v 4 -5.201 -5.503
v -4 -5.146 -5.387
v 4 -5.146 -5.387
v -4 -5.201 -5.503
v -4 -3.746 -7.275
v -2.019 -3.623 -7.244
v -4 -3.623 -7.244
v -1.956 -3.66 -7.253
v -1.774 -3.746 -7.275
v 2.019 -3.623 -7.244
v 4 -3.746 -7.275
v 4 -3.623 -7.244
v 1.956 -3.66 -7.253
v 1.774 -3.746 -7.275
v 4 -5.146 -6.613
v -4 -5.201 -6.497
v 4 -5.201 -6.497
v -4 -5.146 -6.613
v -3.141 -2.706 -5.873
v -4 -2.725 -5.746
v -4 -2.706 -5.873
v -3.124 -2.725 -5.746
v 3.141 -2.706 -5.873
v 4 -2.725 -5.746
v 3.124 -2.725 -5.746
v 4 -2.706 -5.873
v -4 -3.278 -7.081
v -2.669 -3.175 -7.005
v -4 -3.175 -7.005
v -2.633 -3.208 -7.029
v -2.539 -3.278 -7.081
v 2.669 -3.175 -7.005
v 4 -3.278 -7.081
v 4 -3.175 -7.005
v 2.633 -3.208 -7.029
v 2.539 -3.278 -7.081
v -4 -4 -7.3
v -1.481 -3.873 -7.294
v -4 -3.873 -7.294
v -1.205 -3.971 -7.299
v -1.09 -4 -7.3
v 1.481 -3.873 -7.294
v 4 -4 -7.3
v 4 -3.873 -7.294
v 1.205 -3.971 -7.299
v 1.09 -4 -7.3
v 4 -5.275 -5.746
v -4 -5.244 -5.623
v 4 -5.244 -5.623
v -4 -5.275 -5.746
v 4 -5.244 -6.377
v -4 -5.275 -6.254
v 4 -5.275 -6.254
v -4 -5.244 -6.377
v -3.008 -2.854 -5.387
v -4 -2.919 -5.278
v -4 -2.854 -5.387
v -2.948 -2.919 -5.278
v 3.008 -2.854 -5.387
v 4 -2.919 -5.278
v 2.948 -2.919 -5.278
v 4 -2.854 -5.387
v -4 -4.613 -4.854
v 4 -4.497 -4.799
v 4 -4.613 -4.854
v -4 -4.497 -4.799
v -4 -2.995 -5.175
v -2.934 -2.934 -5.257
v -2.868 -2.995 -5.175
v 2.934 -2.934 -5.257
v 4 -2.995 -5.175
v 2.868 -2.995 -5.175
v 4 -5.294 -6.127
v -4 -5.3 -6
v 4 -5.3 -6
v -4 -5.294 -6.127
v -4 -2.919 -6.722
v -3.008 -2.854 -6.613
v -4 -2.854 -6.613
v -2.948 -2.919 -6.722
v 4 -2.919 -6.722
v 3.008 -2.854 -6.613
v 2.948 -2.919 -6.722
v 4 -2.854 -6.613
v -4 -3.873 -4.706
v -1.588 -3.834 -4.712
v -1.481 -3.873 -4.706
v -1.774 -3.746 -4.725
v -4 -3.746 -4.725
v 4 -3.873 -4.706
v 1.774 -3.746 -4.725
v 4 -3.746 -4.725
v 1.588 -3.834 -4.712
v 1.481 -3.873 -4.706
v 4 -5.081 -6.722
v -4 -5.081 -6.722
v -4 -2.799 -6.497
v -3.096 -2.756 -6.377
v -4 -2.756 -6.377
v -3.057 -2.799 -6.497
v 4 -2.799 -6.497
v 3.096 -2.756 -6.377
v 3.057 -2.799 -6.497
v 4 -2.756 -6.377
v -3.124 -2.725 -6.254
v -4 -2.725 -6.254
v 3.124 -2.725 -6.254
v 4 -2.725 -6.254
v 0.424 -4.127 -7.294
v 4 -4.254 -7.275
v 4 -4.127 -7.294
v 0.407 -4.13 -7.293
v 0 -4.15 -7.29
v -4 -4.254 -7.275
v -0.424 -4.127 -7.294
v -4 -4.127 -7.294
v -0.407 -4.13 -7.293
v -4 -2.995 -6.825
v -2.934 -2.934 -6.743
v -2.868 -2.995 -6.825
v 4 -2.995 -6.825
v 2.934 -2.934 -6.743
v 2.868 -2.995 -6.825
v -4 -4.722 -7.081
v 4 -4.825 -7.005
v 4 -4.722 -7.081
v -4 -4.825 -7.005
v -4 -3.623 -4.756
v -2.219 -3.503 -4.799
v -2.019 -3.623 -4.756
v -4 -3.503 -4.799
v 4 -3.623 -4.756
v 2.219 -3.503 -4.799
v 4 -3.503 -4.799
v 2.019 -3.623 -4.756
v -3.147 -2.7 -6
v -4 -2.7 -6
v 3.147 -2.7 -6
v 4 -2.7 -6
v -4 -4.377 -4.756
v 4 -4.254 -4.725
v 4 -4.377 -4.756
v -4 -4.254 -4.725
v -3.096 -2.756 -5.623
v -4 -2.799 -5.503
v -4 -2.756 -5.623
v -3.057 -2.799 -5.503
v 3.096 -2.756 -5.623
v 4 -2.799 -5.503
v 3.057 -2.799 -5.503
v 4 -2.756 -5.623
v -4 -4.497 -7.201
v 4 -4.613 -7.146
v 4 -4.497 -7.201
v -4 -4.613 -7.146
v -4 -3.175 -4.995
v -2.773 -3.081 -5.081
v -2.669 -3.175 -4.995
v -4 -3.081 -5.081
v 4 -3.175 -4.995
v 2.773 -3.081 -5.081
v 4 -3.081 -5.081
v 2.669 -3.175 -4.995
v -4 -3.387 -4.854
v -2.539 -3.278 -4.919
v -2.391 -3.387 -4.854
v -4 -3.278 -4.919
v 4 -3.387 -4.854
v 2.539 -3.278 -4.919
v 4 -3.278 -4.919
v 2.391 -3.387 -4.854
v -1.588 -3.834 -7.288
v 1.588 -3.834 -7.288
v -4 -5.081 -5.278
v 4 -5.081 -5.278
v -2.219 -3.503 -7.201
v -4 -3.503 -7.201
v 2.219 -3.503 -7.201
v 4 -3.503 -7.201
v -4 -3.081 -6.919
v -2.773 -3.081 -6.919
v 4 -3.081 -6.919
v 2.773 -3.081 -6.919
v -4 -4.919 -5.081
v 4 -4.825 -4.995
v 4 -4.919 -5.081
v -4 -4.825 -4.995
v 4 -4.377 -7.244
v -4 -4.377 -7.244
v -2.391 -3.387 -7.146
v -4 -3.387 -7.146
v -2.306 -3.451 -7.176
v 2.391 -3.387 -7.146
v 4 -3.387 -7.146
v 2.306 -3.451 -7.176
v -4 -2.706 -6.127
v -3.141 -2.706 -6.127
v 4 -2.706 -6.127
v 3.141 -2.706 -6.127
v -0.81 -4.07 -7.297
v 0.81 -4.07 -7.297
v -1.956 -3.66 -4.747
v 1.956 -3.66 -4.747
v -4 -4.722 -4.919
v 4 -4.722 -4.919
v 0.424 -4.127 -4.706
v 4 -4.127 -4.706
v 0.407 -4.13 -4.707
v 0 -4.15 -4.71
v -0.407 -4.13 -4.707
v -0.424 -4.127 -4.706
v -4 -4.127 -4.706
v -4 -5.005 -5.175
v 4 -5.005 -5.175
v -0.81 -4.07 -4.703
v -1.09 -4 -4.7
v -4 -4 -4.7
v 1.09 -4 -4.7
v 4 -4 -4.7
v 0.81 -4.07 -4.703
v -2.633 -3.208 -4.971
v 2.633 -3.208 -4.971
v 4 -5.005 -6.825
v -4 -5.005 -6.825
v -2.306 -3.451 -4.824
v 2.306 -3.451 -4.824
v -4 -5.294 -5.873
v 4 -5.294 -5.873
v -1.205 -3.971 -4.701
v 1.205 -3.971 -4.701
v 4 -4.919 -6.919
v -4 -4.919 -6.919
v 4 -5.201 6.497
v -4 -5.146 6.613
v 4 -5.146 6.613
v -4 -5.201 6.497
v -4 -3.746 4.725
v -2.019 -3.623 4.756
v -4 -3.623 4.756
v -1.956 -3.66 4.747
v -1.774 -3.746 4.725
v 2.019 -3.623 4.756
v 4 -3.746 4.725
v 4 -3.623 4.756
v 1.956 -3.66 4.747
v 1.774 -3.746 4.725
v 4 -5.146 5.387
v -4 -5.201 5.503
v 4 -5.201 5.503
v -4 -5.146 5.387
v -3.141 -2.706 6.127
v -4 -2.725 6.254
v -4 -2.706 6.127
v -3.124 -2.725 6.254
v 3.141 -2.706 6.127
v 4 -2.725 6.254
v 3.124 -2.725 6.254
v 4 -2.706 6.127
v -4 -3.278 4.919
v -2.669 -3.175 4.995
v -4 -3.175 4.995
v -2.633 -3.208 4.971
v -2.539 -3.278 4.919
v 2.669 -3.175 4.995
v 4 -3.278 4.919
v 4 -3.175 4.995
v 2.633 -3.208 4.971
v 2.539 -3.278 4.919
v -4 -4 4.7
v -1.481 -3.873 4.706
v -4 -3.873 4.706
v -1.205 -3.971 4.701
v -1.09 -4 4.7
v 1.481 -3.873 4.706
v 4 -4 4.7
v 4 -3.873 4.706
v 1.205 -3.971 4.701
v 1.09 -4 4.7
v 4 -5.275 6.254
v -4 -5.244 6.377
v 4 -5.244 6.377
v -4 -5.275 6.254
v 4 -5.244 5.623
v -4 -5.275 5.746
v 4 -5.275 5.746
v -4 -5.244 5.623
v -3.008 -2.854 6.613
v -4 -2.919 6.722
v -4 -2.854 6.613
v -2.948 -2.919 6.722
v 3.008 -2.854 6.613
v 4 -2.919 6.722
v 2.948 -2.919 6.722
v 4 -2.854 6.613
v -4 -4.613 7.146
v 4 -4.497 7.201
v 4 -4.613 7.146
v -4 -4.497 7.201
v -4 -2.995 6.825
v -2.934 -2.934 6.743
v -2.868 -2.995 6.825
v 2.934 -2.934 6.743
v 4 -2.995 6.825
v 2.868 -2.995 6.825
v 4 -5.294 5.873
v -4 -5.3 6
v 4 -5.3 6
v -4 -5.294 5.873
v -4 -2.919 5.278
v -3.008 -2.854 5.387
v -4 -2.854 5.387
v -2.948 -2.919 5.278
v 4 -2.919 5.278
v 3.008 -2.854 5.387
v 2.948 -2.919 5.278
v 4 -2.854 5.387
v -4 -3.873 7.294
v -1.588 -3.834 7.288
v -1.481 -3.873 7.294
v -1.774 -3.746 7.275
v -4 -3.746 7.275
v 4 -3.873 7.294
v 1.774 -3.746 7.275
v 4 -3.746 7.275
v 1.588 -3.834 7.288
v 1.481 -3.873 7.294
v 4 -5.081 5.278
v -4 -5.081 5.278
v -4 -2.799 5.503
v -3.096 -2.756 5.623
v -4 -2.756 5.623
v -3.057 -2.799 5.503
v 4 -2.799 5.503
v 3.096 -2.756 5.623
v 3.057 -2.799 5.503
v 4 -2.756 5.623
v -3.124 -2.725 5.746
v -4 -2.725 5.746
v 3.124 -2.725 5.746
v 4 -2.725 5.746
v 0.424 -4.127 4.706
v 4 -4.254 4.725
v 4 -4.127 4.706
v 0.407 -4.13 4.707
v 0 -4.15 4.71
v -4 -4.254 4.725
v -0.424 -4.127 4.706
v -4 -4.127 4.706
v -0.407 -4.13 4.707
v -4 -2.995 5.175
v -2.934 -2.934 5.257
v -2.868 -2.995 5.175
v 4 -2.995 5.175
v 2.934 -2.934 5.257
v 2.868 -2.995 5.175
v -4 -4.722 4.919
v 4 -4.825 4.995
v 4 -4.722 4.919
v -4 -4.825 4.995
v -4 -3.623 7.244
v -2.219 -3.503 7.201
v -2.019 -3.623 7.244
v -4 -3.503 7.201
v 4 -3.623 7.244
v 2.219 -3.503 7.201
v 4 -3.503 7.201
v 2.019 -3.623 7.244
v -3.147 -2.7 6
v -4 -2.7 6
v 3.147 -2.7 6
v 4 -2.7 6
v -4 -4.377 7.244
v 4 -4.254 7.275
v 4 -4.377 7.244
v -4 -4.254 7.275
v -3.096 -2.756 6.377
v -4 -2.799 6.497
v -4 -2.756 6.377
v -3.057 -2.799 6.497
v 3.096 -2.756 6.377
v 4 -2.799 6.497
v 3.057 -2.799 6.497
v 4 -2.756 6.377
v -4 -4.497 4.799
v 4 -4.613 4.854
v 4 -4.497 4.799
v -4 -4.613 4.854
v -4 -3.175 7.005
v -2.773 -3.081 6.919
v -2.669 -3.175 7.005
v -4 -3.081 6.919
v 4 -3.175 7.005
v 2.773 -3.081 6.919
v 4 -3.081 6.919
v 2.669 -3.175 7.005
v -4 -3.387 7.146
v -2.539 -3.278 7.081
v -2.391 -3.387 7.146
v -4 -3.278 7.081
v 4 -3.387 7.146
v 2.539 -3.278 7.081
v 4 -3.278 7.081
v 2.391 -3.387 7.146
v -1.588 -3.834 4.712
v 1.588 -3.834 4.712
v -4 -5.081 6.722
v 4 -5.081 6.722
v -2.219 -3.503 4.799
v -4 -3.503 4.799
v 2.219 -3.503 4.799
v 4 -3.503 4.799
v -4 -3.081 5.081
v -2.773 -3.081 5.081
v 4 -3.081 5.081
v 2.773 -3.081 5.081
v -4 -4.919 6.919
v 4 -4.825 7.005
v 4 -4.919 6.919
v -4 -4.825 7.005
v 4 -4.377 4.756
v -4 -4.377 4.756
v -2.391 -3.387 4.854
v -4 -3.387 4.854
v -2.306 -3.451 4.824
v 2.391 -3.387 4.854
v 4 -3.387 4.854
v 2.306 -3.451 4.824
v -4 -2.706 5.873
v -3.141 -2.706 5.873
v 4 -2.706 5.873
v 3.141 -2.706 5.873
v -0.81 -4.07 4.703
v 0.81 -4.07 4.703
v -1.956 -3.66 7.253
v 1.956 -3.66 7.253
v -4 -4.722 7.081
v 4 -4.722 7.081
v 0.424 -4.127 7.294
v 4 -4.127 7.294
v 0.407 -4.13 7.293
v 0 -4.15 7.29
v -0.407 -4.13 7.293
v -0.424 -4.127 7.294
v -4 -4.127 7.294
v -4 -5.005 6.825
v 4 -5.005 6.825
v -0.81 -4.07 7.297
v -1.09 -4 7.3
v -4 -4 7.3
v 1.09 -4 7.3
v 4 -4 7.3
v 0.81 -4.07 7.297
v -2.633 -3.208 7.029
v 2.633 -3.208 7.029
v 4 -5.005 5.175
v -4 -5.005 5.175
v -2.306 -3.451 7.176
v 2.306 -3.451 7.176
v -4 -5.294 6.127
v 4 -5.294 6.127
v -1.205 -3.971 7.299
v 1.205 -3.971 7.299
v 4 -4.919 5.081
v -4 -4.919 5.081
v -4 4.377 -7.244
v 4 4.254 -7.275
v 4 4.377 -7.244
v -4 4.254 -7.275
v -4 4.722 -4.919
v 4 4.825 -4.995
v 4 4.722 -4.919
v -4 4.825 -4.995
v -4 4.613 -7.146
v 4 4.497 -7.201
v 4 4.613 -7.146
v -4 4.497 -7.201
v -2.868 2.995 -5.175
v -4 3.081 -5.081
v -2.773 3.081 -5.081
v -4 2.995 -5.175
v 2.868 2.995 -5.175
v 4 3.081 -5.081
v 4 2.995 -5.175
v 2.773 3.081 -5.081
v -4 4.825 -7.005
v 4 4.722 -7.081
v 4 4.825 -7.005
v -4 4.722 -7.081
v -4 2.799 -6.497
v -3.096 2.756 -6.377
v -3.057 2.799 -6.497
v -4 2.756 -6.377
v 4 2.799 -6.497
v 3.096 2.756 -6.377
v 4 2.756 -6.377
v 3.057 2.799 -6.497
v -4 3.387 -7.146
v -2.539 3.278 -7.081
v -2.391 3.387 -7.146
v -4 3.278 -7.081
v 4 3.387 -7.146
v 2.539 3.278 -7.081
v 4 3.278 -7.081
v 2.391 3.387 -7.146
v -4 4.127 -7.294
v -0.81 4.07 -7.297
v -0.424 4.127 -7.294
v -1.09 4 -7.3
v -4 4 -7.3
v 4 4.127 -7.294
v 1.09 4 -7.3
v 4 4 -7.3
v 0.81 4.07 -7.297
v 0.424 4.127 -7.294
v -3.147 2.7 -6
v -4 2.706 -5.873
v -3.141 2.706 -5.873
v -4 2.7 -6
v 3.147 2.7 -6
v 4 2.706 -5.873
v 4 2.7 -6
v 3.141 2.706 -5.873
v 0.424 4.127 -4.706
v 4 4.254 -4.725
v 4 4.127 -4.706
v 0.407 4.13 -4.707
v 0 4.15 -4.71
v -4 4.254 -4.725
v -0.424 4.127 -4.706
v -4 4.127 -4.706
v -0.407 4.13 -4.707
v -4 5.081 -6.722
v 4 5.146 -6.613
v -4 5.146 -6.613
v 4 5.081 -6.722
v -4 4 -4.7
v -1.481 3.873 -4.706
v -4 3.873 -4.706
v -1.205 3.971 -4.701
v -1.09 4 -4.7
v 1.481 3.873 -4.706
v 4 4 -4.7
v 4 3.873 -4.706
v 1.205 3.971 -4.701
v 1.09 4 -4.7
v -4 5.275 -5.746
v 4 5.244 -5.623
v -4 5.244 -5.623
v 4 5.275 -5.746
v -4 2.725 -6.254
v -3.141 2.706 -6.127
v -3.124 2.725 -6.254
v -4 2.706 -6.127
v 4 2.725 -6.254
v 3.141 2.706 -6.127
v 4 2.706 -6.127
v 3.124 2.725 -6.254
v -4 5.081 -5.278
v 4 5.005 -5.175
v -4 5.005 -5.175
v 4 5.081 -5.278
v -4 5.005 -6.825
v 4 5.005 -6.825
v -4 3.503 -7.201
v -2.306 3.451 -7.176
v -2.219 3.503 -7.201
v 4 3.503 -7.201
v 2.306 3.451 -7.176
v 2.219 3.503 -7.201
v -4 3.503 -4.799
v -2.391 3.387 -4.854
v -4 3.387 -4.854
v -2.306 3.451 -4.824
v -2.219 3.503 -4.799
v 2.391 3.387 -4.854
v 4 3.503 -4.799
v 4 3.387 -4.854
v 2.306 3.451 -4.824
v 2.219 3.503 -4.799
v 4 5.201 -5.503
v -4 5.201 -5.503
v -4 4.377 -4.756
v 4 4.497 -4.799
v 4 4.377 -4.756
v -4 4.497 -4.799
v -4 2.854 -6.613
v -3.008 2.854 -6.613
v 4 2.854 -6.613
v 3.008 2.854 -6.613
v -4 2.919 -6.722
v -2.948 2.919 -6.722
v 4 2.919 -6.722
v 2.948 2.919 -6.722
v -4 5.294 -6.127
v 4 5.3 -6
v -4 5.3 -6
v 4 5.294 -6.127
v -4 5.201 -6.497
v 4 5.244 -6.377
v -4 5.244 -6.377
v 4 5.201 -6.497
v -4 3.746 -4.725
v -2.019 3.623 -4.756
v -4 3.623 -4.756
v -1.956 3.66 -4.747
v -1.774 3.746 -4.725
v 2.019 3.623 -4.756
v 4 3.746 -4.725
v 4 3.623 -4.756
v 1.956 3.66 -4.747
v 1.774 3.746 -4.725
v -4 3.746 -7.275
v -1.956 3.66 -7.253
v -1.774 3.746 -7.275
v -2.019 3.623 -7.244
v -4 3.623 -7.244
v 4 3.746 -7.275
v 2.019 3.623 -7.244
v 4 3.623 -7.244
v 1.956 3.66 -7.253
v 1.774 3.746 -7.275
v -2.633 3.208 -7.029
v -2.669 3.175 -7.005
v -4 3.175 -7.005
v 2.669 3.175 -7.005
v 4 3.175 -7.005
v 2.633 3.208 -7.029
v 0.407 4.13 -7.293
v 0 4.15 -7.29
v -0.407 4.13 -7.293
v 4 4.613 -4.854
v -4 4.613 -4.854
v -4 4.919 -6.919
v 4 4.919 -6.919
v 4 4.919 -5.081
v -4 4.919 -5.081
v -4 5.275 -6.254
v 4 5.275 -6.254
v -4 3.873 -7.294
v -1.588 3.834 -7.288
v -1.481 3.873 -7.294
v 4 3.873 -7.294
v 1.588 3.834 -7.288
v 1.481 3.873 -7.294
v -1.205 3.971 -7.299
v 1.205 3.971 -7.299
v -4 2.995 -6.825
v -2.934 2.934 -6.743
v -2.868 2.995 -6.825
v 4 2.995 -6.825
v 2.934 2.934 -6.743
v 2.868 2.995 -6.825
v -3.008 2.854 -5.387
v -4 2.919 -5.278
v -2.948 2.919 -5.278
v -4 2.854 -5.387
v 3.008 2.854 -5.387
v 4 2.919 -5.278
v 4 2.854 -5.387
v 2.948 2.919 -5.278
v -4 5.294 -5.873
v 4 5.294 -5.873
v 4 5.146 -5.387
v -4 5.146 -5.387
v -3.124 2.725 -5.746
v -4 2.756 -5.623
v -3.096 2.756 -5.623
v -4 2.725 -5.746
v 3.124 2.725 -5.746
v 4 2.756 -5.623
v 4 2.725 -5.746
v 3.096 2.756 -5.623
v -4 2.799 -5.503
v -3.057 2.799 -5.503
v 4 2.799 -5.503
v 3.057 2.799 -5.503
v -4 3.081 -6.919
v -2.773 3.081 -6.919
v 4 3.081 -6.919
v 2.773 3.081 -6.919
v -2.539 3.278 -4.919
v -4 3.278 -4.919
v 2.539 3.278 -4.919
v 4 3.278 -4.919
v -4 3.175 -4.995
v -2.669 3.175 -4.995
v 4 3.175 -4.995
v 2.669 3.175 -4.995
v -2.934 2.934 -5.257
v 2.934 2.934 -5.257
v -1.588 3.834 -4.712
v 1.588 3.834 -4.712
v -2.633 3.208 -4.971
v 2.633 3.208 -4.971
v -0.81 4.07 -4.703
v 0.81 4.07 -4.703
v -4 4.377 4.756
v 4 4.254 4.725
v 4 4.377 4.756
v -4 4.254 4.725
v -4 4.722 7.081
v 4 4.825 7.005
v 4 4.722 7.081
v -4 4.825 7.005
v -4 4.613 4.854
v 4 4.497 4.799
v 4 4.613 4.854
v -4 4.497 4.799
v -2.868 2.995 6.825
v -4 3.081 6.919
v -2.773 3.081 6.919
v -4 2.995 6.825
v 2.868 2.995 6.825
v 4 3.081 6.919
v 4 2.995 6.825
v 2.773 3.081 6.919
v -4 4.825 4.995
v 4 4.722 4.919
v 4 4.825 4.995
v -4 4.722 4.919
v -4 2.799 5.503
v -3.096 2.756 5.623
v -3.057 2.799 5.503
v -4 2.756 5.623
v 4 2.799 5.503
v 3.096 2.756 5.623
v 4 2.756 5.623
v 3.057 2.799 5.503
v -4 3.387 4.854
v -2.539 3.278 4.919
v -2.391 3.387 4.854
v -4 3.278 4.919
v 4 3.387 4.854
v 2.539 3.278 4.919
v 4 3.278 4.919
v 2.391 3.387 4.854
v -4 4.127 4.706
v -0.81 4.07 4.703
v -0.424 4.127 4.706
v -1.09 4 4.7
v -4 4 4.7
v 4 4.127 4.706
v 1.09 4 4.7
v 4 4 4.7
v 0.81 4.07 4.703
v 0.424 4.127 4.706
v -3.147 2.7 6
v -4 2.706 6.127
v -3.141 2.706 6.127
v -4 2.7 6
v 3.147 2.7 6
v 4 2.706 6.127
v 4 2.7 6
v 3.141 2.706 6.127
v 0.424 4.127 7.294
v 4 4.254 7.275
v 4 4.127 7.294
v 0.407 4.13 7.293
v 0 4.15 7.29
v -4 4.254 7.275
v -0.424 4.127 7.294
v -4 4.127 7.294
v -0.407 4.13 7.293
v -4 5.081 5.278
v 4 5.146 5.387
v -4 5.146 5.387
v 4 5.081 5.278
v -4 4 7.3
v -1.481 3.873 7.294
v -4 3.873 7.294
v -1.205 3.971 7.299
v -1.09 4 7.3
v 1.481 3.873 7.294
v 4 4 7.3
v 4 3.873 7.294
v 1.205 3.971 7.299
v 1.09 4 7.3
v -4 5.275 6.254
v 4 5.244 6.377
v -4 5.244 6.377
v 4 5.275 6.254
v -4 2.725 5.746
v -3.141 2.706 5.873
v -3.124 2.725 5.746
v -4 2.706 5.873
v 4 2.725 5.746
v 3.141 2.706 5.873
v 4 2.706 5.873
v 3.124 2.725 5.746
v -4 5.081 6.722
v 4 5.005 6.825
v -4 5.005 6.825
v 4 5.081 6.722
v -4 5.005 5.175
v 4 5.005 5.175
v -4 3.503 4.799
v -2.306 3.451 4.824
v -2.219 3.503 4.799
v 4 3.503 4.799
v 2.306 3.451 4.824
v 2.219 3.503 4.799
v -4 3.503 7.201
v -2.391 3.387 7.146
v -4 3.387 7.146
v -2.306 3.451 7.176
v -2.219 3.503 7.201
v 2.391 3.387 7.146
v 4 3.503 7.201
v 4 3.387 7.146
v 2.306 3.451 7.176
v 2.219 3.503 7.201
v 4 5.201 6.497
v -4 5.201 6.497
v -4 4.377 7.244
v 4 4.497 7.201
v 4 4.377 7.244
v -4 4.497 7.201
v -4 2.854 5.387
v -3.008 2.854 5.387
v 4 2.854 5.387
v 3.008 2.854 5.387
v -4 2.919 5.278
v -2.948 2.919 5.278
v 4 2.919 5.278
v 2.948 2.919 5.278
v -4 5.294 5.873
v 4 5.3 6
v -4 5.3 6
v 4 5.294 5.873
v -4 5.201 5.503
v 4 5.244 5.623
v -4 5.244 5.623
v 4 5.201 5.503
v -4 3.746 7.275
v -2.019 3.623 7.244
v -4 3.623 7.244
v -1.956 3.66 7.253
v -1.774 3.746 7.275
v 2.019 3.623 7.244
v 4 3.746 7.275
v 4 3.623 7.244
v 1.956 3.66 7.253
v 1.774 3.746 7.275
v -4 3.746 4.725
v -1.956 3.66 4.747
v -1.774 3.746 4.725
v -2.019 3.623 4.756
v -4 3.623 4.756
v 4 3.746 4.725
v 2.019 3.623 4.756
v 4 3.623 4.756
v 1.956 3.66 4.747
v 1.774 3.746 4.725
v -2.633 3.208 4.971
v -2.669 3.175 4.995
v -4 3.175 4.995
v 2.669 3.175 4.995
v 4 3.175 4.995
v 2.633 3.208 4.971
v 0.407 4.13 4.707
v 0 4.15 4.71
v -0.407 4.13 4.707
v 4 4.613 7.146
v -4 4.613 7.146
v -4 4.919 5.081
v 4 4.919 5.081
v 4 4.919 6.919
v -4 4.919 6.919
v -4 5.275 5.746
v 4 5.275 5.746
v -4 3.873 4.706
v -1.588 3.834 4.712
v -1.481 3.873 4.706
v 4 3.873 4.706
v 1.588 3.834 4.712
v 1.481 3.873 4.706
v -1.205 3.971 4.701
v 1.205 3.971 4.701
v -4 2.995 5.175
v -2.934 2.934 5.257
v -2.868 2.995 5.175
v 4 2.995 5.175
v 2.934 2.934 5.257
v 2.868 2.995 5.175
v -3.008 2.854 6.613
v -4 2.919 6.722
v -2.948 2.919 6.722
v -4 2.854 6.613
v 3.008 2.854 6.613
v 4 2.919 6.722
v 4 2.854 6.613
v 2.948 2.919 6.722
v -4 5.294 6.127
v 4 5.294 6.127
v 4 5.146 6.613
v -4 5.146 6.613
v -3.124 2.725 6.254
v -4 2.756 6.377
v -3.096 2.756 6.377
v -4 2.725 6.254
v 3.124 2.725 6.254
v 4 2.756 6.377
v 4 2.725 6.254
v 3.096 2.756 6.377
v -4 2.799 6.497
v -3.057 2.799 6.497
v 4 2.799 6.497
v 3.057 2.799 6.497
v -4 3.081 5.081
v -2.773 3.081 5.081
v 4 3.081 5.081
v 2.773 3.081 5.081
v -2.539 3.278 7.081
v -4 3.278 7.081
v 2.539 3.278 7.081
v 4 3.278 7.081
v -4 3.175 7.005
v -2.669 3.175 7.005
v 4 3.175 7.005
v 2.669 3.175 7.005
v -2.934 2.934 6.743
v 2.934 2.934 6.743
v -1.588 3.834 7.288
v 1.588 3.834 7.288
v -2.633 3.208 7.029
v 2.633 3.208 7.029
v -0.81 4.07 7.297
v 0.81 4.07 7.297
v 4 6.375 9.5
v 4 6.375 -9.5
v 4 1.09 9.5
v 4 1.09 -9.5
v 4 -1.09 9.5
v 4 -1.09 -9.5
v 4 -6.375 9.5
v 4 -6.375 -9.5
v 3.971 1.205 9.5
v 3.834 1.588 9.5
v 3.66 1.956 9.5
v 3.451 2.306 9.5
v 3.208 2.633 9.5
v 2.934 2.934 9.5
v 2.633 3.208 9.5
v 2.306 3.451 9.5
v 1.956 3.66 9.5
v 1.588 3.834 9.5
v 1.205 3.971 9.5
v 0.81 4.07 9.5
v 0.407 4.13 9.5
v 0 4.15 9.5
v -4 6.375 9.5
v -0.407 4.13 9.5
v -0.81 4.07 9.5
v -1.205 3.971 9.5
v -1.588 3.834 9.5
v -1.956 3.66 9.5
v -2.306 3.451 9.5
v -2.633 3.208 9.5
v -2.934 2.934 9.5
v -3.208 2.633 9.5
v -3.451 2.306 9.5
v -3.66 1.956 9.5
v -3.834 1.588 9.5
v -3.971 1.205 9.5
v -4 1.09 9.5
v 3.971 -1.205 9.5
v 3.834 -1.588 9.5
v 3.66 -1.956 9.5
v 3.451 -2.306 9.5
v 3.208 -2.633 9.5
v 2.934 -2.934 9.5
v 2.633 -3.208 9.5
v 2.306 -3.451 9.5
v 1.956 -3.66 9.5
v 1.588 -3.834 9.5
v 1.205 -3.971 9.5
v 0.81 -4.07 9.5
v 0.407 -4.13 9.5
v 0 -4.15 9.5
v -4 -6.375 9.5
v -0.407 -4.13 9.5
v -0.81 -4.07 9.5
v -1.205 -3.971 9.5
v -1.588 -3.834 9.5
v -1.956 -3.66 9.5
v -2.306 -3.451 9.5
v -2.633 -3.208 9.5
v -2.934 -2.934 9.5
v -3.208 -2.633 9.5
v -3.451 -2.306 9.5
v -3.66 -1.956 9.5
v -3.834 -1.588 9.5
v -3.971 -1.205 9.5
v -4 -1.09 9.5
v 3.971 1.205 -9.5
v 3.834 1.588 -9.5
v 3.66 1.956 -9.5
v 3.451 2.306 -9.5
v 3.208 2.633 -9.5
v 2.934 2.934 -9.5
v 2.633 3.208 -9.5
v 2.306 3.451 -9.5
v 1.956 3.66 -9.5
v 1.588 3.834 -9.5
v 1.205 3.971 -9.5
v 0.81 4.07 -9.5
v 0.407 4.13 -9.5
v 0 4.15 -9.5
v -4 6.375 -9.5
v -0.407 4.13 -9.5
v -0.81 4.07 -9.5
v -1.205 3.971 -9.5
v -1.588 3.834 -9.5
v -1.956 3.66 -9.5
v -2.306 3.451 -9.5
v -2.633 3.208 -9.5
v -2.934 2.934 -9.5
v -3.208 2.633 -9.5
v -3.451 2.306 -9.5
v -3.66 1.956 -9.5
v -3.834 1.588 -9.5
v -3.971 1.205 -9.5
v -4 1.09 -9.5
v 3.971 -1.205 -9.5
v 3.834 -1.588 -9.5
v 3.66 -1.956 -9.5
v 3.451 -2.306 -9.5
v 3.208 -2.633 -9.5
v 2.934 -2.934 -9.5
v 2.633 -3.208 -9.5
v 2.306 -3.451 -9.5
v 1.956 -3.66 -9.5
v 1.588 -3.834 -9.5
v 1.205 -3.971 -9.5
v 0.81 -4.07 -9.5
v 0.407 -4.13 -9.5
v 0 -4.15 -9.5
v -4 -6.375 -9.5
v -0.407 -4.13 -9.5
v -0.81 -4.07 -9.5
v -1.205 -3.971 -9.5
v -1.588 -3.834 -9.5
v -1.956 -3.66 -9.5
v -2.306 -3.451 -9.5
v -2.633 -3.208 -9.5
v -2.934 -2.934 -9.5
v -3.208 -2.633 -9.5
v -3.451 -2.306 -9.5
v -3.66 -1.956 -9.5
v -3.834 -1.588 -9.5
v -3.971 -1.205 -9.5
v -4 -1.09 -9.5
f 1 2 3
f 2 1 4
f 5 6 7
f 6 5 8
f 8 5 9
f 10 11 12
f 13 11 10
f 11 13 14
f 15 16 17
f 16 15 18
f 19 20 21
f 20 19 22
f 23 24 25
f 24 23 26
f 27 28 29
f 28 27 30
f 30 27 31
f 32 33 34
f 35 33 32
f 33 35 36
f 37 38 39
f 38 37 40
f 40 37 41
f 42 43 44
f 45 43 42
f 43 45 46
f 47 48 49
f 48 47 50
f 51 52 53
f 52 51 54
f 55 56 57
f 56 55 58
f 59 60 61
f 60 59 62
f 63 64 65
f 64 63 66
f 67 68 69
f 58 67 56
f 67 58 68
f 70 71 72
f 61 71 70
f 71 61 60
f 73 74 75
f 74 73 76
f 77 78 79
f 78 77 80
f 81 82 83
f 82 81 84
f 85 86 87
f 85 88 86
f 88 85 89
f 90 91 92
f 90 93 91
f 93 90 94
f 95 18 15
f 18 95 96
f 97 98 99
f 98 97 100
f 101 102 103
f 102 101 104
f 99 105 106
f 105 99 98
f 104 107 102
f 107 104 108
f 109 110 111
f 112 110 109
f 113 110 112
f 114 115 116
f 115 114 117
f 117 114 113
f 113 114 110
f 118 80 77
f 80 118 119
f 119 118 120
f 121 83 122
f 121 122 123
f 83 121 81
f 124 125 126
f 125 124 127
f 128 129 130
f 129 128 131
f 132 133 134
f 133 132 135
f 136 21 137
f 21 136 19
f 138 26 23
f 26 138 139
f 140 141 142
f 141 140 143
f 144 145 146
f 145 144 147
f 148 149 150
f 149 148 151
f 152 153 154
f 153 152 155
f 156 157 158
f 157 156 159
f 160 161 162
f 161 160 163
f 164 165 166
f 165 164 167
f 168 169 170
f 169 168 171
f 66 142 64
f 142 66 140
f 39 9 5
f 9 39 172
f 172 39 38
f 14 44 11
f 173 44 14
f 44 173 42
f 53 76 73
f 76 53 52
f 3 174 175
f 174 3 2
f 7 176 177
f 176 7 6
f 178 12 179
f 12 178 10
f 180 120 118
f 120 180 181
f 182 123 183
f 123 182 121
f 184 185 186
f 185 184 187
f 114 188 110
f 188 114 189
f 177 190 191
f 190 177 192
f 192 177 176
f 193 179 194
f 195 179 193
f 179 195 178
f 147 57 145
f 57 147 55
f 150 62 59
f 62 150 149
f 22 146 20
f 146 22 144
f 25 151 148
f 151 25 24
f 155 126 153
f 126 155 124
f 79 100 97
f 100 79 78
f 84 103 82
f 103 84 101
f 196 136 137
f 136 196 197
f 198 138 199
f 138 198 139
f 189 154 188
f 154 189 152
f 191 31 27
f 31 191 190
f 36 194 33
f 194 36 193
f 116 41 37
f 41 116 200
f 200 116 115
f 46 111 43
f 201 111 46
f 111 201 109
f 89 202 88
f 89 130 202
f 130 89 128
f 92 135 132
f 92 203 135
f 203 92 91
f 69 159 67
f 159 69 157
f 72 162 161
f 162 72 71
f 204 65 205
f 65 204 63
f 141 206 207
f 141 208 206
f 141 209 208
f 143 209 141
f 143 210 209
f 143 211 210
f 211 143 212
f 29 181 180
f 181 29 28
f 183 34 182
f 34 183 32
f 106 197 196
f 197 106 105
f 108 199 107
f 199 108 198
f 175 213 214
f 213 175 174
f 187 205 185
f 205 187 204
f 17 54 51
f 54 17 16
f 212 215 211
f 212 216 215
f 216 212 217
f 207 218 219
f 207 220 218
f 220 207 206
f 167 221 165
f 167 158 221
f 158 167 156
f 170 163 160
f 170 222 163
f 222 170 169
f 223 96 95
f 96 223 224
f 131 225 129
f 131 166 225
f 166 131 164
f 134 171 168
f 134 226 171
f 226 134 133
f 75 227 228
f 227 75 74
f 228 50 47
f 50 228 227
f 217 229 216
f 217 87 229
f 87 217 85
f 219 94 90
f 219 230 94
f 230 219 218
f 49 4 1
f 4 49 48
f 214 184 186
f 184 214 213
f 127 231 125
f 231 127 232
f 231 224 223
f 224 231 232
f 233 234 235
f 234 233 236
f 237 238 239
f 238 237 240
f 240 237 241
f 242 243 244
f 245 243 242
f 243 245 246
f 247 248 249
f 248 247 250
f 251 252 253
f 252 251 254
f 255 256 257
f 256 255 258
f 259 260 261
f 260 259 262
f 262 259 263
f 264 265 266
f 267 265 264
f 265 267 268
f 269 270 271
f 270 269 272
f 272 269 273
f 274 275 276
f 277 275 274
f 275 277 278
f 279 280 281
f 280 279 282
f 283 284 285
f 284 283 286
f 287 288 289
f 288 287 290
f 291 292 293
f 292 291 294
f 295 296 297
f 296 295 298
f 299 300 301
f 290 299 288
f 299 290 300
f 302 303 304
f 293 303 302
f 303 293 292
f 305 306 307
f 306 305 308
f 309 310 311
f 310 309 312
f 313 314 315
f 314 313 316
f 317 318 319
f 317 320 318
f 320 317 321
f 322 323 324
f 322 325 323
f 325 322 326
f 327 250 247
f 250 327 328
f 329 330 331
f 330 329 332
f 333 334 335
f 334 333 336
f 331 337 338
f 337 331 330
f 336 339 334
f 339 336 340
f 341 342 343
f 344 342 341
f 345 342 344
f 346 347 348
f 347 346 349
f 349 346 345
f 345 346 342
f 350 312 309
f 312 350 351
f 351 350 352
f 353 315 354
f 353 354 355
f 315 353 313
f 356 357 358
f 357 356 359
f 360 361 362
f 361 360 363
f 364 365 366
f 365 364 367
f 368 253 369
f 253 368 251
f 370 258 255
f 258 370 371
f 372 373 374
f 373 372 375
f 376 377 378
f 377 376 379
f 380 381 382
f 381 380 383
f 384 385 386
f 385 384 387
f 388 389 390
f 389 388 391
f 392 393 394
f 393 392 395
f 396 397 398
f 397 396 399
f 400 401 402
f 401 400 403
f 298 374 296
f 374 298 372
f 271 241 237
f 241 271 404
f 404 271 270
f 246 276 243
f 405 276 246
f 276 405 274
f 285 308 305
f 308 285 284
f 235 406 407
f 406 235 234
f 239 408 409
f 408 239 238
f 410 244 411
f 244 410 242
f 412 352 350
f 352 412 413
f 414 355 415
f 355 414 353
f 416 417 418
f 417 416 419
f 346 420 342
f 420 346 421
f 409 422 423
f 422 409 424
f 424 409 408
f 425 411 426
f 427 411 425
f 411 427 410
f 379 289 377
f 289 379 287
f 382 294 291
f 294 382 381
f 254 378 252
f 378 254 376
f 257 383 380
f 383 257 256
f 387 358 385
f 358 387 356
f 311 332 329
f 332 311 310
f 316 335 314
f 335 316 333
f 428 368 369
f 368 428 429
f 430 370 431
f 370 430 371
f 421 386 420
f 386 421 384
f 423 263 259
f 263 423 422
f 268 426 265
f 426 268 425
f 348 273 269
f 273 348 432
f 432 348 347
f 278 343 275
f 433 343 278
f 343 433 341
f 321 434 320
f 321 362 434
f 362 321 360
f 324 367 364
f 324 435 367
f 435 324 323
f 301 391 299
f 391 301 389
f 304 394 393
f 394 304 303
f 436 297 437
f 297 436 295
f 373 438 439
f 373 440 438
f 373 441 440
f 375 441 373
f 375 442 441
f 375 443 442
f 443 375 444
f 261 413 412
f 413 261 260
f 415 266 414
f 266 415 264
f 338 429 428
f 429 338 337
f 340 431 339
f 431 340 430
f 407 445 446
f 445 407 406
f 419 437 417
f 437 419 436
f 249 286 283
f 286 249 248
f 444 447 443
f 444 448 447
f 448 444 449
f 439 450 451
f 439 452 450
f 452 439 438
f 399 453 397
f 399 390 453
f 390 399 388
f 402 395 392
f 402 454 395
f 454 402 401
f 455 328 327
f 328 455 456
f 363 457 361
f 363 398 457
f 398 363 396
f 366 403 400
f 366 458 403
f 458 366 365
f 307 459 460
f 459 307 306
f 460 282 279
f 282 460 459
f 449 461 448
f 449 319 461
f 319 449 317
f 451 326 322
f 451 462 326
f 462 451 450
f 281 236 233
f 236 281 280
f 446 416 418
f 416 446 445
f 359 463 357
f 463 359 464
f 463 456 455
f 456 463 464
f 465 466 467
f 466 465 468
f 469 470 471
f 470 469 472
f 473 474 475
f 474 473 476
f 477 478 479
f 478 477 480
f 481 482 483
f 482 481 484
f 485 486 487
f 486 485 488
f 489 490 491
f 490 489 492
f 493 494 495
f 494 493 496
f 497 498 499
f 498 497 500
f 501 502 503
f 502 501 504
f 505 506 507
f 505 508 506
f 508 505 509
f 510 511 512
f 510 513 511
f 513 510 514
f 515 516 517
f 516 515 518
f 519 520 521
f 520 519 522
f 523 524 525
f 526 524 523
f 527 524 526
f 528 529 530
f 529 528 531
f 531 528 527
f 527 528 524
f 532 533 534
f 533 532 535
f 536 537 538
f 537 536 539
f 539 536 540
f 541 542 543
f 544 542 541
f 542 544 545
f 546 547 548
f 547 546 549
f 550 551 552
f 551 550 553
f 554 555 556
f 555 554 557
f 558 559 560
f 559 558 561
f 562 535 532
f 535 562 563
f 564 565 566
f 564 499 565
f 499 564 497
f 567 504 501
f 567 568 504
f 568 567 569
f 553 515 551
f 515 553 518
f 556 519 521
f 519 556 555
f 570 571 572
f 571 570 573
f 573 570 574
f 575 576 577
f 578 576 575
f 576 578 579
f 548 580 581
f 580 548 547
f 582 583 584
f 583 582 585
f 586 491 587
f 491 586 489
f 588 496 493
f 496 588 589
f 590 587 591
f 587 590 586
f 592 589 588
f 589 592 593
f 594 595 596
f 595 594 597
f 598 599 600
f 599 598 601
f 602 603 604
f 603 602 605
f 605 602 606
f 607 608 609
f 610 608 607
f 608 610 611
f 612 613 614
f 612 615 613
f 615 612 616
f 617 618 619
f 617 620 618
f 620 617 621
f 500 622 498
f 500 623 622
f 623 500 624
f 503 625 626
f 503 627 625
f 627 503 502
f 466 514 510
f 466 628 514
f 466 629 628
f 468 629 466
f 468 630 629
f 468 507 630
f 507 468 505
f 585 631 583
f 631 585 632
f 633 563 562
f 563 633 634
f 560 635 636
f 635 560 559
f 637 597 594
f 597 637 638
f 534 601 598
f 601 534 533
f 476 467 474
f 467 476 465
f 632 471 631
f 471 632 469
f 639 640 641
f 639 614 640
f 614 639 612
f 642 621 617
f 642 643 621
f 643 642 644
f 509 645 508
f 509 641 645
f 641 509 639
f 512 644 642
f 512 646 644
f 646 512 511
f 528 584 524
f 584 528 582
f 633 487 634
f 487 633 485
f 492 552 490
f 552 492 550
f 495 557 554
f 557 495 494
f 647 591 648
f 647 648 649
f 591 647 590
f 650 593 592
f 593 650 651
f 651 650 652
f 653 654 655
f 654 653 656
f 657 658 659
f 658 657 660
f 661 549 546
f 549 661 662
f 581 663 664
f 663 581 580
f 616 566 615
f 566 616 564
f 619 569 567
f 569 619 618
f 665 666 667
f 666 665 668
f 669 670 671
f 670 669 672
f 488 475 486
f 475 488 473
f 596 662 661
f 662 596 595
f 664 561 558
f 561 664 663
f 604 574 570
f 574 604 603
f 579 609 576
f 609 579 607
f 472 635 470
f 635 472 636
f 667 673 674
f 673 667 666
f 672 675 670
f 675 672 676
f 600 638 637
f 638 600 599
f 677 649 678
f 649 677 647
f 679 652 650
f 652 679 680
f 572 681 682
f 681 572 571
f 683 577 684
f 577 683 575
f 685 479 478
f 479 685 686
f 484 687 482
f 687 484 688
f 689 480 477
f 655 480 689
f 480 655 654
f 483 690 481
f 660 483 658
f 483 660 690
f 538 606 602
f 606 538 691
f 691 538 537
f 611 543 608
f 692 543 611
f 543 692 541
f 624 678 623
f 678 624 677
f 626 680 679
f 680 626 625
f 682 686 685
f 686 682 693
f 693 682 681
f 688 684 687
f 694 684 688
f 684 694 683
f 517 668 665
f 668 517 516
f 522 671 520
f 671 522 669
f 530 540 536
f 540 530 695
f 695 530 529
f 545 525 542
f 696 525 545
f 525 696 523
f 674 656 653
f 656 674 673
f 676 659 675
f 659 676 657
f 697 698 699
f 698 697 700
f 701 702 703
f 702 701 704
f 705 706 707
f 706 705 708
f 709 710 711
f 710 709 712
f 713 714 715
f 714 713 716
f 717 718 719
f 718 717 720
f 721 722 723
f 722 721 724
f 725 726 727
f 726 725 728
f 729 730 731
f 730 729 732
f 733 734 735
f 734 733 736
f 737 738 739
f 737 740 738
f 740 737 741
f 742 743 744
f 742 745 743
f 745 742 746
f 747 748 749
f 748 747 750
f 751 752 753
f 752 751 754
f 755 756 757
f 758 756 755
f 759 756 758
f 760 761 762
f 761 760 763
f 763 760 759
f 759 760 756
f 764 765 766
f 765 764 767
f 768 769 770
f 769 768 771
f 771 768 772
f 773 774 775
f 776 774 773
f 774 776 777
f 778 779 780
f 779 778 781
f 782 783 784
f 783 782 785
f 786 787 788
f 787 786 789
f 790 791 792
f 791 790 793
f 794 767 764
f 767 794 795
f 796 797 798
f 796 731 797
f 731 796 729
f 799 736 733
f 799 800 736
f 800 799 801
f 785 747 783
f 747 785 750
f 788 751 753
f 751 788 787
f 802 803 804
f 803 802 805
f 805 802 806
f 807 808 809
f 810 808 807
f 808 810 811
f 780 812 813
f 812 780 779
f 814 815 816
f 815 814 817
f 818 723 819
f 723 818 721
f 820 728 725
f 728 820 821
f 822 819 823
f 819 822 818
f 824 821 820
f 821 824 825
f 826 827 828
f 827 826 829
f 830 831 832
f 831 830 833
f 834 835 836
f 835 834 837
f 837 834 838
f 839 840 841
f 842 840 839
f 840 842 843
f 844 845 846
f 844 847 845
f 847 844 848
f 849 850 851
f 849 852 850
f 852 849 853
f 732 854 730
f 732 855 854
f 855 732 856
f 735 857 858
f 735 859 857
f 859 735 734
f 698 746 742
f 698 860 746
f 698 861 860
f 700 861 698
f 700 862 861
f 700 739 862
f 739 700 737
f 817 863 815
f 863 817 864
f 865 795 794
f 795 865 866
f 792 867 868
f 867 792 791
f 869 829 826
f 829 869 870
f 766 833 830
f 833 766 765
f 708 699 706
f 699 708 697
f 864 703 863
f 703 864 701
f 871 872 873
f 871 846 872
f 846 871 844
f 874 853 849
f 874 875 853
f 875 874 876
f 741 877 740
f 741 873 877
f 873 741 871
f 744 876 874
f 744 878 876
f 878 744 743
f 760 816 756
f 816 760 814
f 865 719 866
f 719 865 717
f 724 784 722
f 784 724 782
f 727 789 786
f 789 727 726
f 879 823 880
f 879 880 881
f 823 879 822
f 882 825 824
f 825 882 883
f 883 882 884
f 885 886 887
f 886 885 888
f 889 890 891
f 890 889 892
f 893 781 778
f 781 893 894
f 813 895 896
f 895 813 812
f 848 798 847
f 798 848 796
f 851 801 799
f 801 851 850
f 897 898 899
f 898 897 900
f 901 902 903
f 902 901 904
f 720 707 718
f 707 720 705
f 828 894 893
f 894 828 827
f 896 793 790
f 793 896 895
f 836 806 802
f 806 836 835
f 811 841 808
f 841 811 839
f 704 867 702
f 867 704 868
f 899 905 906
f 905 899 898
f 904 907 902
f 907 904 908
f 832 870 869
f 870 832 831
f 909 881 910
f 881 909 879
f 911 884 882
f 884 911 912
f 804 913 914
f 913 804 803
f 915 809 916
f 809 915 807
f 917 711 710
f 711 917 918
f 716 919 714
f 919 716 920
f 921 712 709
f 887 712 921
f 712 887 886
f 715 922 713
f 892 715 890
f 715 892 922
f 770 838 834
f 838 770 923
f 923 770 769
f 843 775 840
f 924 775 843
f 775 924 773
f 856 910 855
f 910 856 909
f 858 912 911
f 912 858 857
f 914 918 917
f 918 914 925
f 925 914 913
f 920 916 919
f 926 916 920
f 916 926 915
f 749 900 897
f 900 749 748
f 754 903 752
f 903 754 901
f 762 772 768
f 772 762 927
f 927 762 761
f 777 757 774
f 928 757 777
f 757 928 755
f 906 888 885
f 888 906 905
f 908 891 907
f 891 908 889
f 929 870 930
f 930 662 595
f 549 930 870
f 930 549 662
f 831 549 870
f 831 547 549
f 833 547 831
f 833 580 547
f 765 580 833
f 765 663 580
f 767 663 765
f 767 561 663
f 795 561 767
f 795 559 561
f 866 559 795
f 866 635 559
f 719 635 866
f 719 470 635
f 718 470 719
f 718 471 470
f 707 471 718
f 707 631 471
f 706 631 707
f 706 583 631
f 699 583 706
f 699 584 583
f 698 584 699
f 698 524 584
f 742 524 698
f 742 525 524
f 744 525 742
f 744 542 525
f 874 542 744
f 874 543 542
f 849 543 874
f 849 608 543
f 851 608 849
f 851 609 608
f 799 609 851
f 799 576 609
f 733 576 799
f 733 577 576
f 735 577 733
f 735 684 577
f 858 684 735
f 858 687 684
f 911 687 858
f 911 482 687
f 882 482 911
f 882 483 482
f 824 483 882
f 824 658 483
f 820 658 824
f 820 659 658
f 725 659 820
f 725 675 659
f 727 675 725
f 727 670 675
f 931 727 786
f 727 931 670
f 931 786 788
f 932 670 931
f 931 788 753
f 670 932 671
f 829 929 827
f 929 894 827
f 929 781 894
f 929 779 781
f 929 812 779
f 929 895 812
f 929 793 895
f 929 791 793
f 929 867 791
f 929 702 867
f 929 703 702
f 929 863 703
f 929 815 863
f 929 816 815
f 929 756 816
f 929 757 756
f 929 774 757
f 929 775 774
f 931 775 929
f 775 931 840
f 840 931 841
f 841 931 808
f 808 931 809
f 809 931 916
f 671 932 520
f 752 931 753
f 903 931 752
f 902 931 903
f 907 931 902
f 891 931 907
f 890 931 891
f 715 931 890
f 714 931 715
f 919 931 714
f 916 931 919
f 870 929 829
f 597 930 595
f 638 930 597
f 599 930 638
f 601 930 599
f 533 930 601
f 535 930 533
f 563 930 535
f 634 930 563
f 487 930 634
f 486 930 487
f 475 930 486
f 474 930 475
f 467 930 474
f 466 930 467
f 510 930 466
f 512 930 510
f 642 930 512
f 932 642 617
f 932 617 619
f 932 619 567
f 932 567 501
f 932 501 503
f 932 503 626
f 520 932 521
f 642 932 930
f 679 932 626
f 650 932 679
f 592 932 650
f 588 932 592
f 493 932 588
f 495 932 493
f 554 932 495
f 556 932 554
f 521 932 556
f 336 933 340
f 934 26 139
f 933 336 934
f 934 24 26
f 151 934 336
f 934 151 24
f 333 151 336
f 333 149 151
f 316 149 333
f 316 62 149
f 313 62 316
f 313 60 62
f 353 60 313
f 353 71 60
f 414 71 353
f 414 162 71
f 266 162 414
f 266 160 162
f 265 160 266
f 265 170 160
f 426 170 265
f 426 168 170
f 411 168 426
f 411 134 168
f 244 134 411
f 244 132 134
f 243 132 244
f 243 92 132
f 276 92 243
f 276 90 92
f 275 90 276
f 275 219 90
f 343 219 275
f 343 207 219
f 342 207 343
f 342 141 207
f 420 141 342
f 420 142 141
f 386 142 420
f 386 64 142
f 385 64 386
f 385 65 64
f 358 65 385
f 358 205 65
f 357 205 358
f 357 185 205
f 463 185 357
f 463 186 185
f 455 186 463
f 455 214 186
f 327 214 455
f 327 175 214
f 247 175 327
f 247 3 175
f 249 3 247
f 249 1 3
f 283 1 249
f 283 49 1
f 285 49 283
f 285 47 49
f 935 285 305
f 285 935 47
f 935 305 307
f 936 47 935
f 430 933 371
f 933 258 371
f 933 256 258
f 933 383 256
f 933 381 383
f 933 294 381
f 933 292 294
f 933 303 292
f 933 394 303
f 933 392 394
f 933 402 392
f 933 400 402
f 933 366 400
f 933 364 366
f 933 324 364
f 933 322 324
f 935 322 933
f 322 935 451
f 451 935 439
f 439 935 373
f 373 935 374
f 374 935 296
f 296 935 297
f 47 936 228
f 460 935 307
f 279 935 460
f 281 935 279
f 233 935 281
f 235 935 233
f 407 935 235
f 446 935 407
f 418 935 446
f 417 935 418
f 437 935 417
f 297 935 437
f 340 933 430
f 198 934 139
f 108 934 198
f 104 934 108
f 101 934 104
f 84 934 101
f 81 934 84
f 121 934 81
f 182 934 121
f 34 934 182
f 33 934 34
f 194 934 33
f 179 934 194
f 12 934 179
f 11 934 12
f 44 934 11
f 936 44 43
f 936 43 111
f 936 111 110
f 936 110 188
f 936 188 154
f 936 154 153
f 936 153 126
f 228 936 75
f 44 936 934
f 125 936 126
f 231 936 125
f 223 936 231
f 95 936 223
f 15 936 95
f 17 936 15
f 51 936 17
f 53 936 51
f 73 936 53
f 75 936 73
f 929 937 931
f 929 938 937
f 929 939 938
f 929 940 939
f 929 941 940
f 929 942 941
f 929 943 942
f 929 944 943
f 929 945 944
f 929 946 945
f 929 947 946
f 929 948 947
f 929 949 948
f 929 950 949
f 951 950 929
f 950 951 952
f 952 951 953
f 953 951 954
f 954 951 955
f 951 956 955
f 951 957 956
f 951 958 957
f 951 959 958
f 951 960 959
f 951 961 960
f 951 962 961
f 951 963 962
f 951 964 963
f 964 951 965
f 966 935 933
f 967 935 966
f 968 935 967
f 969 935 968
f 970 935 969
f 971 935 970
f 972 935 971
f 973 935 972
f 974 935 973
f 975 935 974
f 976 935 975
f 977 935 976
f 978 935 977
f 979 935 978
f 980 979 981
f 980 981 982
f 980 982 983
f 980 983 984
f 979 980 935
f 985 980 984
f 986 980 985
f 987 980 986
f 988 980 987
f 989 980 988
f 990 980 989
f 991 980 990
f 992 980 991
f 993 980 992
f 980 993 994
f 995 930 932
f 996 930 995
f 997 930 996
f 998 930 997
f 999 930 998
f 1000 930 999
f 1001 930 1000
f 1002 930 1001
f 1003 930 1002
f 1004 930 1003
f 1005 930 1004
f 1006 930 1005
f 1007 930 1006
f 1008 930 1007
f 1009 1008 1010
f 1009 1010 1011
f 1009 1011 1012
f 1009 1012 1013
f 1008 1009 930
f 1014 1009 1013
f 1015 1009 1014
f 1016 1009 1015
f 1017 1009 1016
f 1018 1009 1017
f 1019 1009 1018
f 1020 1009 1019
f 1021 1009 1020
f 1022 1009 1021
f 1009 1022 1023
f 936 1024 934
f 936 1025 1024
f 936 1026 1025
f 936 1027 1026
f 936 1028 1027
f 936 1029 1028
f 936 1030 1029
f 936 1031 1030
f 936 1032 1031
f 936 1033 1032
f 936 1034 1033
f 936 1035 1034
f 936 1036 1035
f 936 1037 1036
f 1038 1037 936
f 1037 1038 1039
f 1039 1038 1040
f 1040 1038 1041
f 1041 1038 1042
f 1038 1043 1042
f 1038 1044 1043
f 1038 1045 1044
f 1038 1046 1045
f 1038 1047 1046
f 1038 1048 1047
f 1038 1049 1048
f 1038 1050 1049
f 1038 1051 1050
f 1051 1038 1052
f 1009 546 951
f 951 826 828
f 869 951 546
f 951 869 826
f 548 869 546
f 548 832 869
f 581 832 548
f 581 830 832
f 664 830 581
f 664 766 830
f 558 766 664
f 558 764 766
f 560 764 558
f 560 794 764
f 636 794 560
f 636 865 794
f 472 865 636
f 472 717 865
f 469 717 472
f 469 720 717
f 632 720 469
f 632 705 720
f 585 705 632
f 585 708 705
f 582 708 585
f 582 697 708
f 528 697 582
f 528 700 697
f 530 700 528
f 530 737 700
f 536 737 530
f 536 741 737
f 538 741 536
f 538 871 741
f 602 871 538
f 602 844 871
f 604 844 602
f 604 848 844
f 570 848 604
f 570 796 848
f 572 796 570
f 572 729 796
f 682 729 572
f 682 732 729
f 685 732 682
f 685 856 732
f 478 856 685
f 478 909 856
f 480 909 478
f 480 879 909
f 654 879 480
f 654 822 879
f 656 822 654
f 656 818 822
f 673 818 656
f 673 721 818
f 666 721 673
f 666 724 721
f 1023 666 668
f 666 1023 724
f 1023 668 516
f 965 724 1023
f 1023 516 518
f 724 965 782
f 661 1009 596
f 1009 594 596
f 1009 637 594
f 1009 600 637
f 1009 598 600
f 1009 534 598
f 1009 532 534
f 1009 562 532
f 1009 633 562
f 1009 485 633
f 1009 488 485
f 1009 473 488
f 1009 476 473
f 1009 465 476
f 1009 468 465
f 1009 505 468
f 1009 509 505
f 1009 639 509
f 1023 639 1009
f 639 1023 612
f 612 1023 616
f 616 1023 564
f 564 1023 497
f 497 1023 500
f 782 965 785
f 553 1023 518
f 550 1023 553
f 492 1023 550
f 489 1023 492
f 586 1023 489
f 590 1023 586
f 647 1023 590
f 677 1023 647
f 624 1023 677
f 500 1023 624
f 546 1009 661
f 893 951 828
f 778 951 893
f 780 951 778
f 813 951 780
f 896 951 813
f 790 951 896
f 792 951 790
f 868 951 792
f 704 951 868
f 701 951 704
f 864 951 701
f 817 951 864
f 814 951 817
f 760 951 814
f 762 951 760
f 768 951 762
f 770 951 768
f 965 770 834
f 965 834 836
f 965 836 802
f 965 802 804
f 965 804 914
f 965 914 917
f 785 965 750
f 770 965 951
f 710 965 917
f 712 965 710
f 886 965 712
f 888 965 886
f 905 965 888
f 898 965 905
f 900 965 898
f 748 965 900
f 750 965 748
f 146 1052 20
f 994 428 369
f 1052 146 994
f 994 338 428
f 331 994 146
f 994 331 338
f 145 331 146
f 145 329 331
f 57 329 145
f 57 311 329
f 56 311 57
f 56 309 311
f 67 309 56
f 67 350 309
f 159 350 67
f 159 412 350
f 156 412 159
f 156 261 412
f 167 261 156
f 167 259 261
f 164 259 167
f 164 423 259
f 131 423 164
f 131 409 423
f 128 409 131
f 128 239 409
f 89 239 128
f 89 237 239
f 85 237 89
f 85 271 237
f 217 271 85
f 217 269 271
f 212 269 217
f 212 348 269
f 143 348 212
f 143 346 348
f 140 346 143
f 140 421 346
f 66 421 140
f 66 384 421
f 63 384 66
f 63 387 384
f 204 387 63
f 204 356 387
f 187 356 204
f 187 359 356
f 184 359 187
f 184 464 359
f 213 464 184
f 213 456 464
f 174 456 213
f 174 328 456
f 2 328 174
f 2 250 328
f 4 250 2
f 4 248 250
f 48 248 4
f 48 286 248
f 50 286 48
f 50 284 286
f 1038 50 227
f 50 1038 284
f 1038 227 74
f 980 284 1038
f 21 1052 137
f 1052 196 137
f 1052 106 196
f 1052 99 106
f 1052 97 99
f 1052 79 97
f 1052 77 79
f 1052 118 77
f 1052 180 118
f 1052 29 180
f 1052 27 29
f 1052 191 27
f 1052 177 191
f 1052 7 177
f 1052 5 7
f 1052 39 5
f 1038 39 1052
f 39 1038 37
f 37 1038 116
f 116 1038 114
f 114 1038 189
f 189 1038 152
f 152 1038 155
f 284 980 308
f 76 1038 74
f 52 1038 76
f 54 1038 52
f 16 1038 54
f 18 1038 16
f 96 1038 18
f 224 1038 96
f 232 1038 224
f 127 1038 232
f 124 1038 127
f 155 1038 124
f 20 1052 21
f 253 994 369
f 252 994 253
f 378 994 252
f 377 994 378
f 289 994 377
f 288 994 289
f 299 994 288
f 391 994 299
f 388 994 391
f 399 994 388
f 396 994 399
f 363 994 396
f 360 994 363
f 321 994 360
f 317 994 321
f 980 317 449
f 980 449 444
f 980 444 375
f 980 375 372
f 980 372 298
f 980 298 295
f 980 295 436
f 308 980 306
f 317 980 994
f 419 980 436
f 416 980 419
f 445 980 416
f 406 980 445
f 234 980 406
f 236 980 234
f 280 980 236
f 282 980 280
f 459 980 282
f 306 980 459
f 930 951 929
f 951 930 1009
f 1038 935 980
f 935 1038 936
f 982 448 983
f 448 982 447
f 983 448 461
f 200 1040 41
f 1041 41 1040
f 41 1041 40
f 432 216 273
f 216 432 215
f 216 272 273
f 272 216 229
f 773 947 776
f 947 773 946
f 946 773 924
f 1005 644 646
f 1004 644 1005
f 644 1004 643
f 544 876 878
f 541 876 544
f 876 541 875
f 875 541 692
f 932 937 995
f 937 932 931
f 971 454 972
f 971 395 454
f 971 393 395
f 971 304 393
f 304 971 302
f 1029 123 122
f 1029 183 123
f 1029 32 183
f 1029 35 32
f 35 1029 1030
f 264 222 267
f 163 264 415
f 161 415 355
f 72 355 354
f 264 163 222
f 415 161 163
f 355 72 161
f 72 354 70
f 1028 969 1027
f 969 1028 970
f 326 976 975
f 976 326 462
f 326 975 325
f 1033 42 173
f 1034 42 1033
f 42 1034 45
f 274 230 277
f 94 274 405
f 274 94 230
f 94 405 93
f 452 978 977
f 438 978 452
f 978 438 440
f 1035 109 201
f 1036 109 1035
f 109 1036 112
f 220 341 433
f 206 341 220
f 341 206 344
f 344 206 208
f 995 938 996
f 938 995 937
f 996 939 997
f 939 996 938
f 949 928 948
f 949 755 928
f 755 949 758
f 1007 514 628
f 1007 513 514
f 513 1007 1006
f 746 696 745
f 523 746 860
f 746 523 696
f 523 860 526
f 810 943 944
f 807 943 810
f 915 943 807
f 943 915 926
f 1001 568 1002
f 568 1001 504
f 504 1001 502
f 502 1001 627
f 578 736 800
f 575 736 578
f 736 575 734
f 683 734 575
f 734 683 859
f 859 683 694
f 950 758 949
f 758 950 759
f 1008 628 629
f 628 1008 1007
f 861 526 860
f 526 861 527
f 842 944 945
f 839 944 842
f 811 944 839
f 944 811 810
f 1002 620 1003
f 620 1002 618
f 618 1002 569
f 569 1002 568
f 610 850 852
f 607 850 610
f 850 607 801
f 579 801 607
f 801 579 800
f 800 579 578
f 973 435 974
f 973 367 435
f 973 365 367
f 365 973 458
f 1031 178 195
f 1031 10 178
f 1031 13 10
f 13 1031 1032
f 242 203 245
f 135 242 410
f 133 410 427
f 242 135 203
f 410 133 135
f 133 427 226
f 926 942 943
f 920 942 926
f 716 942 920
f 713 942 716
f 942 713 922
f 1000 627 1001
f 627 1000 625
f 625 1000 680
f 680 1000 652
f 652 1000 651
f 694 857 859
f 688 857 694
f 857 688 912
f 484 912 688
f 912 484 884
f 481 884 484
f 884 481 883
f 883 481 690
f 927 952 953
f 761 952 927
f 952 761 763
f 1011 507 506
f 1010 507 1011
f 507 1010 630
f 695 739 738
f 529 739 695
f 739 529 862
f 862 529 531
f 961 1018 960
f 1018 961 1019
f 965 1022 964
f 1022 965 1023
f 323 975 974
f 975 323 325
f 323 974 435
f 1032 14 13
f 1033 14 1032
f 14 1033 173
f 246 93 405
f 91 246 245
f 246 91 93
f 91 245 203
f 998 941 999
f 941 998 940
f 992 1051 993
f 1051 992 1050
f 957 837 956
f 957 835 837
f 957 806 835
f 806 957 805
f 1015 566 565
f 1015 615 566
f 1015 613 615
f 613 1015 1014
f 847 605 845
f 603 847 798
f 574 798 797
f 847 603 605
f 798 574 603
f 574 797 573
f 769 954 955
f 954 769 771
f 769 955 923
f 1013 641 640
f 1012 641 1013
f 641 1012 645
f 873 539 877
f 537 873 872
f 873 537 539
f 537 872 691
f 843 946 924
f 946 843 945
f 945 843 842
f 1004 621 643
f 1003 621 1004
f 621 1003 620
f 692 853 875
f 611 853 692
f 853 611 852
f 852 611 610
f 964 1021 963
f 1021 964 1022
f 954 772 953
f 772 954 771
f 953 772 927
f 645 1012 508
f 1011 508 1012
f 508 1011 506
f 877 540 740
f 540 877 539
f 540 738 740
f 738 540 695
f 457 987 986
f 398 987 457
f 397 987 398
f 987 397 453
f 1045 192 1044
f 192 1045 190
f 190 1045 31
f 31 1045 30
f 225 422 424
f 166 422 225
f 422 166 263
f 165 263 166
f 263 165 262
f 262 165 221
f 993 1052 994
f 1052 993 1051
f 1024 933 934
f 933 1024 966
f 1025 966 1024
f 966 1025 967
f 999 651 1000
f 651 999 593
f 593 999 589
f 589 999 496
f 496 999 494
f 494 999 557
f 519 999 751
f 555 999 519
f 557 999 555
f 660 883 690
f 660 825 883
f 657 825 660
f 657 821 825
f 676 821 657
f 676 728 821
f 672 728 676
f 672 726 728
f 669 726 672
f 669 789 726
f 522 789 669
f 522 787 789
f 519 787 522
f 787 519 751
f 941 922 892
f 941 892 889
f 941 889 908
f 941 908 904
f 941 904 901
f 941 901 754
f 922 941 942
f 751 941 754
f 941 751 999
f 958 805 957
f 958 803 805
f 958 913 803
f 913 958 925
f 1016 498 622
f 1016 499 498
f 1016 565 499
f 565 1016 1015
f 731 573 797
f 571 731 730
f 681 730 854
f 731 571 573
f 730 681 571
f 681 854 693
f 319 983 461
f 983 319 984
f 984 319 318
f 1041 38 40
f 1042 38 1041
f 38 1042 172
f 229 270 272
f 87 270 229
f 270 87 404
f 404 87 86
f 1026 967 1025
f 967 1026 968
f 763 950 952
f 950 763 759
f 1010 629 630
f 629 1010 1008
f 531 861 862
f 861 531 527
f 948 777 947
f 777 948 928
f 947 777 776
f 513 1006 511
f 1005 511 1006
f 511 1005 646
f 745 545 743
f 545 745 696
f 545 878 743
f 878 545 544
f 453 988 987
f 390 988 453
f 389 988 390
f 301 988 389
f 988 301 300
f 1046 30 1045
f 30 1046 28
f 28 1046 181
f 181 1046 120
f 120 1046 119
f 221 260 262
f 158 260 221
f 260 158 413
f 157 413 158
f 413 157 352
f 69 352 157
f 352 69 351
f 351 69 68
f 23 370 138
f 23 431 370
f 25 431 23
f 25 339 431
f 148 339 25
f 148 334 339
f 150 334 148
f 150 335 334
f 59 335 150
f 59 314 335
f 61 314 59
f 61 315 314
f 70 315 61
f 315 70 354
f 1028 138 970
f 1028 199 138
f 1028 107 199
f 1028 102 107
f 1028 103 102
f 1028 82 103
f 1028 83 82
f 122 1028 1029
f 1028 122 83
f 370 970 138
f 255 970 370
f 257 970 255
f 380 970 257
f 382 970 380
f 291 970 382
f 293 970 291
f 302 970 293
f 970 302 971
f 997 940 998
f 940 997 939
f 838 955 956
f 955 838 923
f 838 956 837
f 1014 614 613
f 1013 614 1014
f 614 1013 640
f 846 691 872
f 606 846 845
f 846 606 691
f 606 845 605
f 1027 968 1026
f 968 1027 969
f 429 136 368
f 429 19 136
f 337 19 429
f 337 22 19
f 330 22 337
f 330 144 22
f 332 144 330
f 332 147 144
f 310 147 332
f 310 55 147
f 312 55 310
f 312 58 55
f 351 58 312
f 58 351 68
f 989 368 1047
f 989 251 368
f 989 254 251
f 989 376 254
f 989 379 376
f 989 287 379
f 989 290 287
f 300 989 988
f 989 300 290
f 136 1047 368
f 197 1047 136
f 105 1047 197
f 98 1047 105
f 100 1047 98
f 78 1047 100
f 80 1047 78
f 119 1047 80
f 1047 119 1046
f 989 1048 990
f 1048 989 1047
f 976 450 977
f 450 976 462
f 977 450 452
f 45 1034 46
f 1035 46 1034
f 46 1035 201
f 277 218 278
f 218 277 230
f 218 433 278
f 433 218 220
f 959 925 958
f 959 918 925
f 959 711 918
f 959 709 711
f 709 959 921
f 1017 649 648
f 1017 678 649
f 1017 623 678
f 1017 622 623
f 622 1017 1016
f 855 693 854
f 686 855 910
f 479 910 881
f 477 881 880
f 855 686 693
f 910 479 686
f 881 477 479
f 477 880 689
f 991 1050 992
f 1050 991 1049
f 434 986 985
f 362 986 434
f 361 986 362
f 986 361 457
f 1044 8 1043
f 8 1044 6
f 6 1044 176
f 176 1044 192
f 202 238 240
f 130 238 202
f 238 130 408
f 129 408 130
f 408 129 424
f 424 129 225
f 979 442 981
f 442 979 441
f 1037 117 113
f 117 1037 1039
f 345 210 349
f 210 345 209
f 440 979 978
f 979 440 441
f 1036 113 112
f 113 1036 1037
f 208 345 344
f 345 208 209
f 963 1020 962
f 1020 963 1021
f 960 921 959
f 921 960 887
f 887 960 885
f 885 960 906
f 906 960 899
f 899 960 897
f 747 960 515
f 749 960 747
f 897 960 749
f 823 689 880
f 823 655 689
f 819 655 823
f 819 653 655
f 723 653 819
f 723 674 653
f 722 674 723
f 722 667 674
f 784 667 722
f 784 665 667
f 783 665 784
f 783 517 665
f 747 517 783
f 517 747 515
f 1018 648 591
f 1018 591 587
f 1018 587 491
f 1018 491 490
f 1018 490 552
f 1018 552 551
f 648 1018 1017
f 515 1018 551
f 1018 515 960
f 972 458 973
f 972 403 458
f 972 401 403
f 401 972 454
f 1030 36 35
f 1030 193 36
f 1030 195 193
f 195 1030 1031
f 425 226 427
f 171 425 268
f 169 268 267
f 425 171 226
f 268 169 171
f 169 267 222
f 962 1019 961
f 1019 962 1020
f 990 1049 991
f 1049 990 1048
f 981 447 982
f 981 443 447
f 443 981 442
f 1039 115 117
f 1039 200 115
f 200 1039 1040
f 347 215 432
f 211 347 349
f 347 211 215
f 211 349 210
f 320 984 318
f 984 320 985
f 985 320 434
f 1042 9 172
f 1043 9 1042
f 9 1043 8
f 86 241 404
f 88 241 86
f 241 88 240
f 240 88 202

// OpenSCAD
$fn=64;

block_x = 8.0;
block_y = 12.75;
block_z = 19.0;

module nut_housing_body(x, y, z) {
    translate([-x/2, -y/2, -z/2])
        cube([x, y, z], center=false);
}

module leadscrew_bore(d, z, clearance=0.2) {
    cylinder(d=d+clearance, h=z+0.4, center=true);
}

module mounting_holes(y, z, d=2.6, y_offset=4.0, z_offset=6.0) {
    for (sy = [-1, 1], sz = [-1, 1]) {
        translate([0, sy*y_offset, sz*z_offset])
            rotate([0, 90, 0])
                cylinder(d=d, h=block_x+0.6, center=true);
    }
}

difference() {
    nut_housing_body(block_x, block_y, block_z);
    leadscrew_bore(8.0, block_z, clearance=0.3);
    mounting_holes(block_y, block_z, d=2.6, y_offset=4.0, z_offset=6.0);
}
